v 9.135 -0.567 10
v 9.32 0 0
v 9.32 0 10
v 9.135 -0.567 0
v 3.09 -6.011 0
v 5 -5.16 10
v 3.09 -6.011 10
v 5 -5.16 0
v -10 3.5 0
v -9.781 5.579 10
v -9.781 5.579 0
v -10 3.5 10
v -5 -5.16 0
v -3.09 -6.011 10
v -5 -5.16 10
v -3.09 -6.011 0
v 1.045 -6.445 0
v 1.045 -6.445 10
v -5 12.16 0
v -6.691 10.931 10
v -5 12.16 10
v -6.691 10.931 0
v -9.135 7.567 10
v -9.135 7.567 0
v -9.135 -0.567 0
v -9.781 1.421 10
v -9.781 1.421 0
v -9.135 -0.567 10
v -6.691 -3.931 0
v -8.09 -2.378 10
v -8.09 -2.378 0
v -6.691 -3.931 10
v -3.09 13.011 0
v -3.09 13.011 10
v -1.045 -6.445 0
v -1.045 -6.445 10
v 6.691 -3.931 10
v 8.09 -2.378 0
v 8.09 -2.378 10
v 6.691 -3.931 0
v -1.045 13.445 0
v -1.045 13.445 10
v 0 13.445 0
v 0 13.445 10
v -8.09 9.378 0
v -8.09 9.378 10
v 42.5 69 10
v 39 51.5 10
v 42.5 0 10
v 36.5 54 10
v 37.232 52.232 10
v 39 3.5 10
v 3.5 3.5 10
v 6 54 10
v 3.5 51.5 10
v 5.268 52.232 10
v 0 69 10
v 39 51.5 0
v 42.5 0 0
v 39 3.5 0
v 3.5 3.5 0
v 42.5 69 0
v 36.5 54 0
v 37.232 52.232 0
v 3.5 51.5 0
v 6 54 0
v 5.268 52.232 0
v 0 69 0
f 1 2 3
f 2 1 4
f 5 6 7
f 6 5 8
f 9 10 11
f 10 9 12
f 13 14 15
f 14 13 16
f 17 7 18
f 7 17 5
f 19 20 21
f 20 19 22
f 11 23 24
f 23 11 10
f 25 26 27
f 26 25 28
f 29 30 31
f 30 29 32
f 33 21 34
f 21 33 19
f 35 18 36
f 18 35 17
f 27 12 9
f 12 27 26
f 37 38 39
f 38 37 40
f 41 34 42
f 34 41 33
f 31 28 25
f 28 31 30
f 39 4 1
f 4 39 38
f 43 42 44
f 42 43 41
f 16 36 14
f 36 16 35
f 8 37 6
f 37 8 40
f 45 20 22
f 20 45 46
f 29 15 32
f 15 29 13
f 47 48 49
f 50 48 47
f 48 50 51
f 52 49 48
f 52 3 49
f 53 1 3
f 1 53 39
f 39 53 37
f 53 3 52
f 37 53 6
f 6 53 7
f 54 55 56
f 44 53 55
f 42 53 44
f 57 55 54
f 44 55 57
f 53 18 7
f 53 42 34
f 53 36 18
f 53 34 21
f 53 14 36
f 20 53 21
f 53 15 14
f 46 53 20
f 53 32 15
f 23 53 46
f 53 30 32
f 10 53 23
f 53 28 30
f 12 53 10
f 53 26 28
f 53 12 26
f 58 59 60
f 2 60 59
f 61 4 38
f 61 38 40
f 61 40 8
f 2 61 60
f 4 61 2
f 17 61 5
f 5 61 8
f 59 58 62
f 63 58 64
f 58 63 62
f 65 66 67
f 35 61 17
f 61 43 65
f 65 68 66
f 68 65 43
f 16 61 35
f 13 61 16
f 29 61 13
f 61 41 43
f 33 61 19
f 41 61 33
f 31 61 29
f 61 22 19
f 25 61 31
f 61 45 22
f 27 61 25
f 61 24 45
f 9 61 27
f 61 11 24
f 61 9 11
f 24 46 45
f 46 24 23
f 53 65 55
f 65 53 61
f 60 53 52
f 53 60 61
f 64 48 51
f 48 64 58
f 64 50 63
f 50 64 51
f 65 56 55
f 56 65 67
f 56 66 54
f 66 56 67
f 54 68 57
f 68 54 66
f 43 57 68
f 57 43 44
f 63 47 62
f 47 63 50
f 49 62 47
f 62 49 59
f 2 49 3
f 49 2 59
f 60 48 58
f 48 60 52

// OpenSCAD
door_thickness = 35.5;
length = 60; // not overall length, doesn't include the guides
height = 10;
stop_size = 20;
tensioner = 5;
part_thickness = 7;
door_guides = true;
door_tensioners = true;



cube([(door_thickness + (part_thickness)), (part_thickness/2), height]);

cube([(part_thickness/2), (length), height]);

translate([(door_thickness + (part_thickness/2)),0,0])
cube([(part_thickness/2), (length), height]);



difference(){

translate([0,part_thickness/2, height/2]) 
    color("blue") 
    cylinder(r=stop_size/2,h=height,center=true)
     //cube([door_thickness + part_thickness, (length - part_thickness) + (part_thickness/2), height])

    ;  
      
   
translate([part_thickness/2,part_thickness/2,0]) 
    color("Orange")
    cube([door_thickness, (length - part_thickness), height])
    ;
}



if (door_tensioners) {
//tensioner 1
translate([(part_thickness/2)+door_thickness,
            ((length - part_thickness)+(part_thickness/2))-(tensioner/2), 
            (height/2)]) 
         color("red") 
            cylinder(r=tensioner/2,h=height,center=true);


//tensioner 2
translate([part_thickness/2,
            ((length - part_thickness)+(part_thickness/2))-(tensioner/2), 
            (height/2)]) 
        color("green") 
            cylinder(r=tensioner/2,h=height,center=true);
}




//Guides to help put onto door
module guide0(l, w, h, trnx, trny){
    

translate([trnx,trny,height])
    rotate([90,90,180])
    
    color("pink") 
    polyhedron(
               points=[[0,0,0], [l,0,0], [l,w,0], [0,w,0], [0,w,h], [l,w,h]],
               faces=[[0,1,2,3],[5,4,3,2],[0,4,5,1],[0,3,4],[5,2,1]]
               );
}
module guide1(l, w, h, trnx, trny){
translate([trnx,trny,0]) 
    
    rotate([180,270,90])
    
    color("purple") 
    polyhedron(
               points=[[0,0,0], [l,0,0], [l,w,0], [0,w,0], [0,w,h], [l,w,h]],
               faces=[[0,1,2,3],[5,4,3,2],[0,4,5,1],[0,3,4],[5,2,1]]
               );
}




if (door_guides) {
    if (door_tensioners) {
        guide0(height, (part_thickness/2)+(tensioner/2), (tensioner*3), 
                (part_thickness/2)+(tensioner/2), 
                ((length - part_thickness)+(part_thickness/2))-(tensioner/2));
        
        
        guide1(height, (part_thickness/2)+(tensioner/2), (tensioner*3),
                (part_thickness/2)-(tensioner/2)+door_thickness,
                ((length - part_thickness)+(part_thickness/2))-(tensioner/2));
    }
    else{
         guide0(height, (part_thickness/2), (tensioner*3),
                (part_thickness/2), 
                ((length - part_thickness)+(part_thickness/2)));
        
         guide1(height, (part_thickness/2), (tensioner*3),
                (door_thickness+part_thickness/2),
                ((length - part_thickness)+(part_thickness/2)));
        
    }
}





//difference(){
//  cube([door_thickness + part_thickness, (length - part_thickness) + (part_thickness/2), height]);  
 // translate([part_thickness/2,part_thickness/2,0]) color("Orange") cube([door_thickness, (length - part_thickness), height]);
//}






